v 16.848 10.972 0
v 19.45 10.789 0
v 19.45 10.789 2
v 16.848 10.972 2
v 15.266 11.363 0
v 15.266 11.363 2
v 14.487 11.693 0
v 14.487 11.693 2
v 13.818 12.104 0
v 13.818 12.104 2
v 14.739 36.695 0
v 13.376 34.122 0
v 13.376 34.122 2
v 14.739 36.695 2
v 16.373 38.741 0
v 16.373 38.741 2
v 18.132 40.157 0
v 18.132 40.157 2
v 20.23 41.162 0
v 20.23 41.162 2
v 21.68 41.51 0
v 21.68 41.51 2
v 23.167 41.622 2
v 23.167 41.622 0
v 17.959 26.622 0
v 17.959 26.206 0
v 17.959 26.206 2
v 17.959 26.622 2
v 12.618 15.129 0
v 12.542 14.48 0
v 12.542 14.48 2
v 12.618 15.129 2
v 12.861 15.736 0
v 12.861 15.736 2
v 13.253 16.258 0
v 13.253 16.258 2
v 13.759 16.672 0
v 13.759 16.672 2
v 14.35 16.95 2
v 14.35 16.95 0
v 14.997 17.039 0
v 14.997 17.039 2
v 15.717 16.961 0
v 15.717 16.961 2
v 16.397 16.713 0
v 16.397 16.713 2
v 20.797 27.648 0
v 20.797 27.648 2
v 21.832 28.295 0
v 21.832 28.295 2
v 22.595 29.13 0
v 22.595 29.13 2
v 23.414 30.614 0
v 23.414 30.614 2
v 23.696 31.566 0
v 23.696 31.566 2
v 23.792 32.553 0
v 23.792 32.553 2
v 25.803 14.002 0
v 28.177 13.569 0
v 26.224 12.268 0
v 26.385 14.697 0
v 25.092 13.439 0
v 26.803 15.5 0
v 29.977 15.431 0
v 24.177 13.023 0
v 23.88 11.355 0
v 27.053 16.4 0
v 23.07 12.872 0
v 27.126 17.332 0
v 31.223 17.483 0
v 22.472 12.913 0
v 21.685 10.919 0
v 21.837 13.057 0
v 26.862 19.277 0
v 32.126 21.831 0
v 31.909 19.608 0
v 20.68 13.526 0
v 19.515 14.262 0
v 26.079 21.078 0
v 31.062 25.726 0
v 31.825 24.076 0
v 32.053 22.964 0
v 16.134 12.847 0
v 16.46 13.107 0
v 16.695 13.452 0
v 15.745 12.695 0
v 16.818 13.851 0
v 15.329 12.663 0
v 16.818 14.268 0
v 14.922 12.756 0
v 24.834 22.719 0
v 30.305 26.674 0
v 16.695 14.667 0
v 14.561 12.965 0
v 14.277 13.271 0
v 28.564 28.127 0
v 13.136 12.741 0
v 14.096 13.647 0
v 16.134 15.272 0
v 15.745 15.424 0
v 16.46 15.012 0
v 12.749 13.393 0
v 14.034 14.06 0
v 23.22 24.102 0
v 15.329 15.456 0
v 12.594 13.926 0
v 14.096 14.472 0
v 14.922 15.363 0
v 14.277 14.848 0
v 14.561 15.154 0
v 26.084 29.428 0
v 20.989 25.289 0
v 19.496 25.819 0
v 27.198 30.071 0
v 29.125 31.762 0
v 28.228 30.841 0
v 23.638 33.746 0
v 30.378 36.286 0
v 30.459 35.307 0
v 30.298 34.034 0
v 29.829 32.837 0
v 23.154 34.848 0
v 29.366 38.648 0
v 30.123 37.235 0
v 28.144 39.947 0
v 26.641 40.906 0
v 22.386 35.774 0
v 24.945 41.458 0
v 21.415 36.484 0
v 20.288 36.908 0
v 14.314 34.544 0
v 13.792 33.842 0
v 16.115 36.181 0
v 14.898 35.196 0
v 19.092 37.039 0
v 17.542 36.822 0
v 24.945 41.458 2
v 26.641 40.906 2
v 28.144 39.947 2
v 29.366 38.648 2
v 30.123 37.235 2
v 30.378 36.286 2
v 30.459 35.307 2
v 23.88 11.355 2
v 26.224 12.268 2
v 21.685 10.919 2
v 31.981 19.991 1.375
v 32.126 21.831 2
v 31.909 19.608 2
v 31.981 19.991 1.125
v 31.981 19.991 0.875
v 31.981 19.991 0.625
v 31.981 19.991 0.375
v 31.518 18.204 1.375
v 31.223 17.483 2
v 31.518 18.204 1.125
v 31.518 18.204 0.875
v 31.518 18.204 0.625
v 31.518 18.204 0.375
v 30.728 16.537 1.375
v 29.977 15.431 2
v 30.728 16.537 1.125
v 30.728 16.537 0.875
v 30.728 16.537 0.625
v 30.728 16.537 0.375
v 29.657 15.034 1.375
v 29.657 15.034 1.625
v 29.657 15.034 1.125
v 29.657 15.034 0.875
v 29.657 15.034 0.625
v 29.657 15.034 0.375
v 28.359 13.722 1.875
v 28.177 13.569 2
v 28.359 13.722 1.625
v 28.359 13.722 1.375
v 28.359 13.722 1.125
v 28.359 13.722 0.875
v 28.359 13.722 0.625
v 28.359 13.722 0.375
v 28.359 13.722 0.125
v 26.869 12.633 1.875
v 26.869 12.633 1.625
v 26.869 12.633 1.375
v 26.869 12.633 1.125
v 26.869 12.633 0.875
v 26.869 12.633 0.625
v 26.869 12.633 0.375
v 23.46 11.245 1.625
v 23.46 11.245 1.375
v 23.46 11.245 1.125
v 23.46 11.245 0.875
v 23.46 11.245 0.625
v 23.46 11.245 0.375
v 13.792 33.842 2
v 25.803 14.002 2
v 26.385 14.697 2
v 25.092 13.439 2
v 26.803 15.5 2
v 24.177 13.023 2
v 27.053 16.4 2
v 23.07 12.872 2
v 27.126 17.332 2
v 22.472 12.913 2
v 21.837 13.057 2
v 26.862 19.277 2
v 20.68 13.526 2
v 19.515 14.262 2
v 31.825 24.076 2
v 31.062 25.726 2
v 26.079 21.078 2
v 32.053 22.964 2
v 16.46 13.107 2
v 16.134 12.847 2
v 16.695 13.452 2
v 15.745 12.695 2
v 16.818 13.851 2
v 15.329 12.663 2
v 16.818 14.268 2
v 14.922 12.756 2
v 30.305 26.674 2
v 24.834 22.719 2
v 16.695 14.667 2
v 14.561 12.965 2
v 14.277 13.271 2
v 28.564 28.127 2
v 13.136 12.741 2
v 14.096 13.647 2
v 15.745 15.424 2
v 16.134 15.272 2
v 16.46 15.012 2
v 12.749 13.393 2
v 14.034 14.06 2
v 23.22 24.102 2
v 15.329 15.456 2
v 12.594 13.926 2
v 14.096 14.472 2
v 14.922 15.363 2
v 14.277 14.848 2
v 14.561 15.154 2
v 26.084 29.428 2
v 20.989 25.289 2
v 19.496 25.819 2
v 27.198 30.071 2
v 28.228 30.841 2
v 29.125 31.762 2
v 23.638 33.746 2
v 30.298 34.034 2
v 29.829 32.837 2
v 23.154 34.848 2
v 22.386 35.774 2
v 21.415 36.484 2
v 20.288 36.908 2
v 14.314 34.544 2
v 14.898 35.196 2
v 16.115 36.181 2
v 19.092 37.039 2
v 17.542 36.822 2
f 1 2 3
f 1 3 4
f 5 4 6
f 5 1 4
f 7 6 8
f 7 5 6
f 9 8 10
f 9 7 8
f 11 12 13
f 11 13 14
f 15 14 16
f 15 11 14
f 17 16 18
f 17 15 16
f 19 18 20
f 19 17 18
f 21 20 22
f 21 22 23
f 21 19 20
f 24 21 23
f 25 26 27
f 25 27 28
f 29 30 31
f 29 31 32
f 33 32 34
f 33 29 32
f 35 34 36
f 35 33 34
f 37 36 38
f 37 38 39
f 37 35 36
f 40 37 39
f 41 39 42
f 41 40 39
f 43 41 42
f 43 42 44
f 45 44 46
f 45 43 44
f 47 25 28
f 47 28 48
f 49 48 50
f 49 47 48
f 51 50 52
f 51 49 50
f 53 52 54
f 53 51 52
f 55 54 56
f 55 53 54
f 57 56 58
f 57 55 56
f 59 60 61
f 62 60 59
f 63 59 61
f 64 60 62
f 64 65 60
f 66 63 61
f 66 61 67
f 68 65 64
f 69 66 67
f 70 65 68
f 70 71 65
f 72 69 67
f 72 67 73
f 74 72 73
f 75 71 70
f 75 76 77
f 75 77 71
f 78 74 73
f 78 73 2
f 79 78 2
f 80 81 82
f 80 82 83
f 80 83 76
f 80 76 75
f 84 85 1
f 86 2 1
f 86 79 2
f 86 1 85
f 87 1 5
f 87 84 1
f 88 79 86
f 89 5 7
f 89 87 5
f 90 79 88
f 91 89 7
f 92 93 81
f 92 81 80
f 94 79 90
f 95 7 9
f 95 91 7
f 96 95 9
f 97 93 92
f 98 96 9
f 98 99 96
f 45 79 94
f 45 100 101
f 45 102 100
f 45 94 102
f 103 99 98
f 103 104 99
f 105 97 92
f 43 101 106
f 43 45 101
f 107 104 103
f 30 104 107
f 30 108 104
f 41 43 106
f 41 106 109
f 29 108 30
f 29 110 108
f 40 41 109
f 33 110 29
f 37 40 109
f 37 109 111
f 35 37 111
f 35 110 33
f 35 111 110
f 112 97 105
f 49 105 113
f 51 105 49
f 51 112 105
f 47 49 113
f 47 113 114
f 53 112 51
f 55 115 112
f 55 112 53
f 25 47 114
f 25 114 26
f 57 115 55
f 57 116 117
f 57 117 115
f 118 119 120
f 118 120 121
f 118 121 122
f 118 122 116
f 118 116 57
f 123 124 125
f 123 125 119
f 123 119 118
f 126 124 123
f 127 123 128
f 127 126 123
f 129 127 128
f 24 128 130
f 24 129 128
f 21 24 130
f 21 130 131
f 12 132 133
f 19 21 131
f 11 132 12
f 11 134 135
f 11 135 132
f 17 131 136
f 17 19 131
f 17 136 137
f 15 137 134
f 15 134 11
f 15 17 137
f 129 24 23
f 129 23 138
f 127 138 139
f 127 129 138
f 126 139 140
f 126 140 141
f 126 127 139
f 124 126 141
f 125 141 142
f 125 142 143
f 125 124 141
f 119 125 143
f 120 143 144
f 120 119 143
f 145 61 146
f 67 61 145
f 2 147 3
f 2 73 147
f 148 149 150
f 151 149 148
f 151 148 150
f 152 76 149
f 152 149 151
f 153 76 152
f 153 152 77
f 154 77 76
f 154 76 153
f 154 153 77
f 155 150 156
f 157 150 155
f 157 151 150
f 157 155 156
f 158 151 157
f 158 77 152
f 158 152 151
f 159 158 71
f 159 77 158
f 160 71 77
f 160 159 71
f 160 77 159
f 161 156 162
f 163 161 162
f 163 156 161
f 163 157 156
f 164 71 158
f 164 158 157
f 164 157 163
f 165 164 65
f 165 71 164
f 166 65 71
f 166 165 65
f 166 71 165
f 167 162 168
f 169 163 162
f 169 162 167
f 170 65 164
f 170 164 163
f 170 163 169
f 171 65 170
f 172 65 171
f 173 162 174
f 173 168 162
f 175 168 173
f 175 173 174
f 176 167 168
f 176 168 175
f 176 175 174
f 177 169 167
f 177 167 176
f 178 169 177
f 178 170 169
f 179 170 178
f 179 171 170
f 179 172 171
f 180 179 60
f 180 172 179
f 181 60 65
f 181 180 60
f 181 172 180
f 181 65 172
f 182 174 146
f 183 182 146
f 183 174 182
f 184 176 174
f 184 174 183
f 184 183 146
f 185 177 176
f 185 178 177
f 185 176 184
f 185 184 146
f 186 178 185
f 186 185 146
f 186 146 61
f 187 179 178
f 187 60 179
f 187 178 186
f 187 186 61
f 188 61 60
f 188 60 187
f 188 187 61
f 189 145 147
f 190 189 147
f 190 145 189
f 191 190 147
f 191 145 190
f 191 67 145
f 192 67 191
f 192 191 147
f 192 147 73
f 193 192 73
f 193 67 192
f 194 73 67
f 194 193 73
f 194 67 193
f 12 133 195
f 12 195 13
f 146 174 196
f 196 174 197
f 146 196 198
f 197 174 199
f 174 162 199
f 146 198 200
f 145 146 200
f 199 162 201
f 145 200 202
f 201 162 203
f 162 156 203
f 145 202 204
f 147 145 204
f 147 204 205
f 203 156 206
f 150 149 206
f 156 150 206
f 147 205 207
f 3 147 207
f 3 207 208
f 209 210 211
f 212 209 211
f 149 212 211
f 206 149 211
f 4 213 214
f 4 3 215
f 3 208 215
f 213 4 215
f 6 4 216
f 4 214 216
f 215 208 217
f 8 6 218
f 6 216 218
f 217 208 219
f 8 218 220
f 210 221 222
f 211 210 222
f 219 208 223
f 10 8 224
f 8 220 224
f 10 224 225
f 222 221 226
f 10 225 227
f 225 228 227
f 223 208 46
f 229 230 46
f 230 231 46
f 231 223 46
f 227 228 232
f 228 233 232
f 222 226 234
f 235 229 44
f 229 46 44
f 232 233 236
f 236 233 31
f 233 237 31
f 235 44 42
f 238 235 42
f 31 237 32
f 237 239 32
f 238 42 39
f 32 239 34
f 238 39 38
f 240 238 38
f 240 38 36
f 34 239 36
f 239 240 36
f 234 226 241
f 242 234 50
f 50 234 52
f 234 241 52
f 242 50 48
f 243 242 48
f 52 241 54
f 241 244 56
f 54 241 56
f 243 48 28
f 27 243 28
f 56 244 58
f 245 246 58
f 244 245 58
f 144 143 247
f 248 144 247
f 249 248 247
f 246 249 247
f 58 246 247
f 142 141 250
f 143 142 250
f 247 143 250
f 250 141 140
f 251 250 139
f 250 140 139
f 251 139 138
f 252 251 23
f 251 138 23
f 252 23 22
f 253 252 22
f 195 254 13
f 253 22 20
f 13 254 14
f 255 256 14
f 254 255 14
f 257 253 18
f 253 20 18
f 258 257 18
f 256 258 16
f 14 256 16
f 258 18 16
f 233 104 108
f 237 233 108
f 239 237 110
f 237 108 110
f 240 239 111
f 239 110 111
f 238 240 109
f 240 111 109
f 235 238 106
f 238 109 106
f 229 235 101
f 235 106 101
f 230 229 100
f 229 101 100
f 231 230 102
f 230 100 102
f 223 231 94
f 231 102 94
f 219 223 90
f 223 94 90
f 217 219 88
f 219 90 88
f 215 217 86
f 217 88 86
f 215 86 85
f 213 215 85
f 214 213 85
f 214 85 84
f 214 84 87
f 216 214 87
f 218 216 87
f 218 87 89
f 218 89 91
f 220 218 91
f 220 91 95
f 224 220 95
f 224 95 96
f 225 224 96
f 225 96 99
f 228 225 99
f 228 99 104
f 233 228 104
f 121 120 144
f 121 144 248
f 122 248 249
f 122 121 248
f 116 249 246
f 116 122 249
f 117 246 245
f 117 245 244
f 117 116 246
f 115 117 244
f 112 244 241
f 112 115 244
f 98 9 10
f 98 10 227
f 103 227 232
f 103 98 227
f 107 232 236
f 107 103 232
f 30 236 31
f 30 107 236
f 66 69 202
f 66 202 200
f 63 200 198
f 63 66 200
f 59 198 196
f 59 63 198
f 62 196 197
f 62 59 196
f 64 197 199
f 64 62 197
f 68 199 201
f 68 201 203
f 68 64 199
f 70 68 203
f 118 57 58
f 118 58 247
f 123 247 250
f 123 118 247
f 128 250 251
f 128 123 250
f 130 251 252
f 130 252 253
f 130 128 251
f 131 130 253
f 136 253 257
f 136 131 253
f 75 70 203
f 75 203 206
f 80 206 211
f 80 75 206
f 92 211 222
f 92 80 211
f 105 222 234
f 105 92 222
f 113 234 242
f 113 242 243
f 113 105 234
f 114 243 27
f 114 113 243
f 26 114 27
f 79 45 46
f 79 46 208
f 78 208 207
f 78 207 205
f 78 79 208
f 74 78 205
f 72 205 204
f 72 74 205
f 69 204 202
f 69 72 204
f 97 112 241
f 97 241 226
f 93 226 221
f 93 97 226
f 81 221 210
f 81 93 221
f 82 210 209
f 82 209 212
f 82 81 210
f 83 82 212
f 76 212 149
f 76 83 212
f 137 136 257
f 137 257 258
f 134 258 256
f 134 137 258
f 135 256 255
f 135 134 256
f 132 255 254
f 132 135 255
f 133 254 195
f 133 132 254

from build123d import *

# Parameters (mm, degrees)
BOSS_EXTRU_1_DEPTH     = 2
D_GAGEMENT_M1_61_D     = 2.8
D_GAGEMENT_M1_61_DEPTH = 50


with BuildPart() as part:
    # Esquisse1 → Boss.-Extru.1 (new body)
    with BuildSketch(Plane.XY):
        with BuildLine():
            Line((17.959030639, 26.205600965), (17.959030639, 26.622267631))
            add(Edge.make_bspline(
                [(17.959030639, 26.622267631), (18.343864616, 26.741397646), (19.054570562, 26.961405273), (20.022450596, 27.297920725), (20.793226188, 27.636579921), (21.41178798, 27.961488766), (21.908982881, 28.341815064), (22.337860827, 28.794274398), (22.745767228, 29.315922342), (23.100821165, 29.915217516), (23.404700203, 30.554453208), (23.629309446, 31.215567304), (23.763709267, 31.883766695), (23.782865125, 32.331325489), (23.792363972, 32.553257215)],
                knots=[0, 0, 0, 0, 0.001208643, 0.002232104, 0.00307162, 0.00373306, 0.004322927, 0.004939873, 0.005598809, 0.006305572, 0.007024936, 0.007718746, 0.008395454, 0.009061078, 0.009061078, 0.009061078, 0.009061078], degree=3))
            add(Edge.make_bspline(
                [(23.792363972, 32.553257215), (23.777386918, 32.852688112), (23.748055085, 33.439108991), (23.476567737, 34.279205766), (23.05714352, 35.057842573), (22.458742382, 35.737618504), (21.754419772, 36.319188825), (20.93943387, 36.736582451), (20.042557045, 36.993204136), (19.414778602, 37.023400823), (19.091843139, 37.038934298)],
                knots=[0, 0, 0, 0, 0.000895934, 0.001754643, 0.002622874, 0.003532401, 0.004453596, 0.005347517, 0.006260578, 0.00722783, 0.00722783, 0.00722783, 0.00722783], degree=3))
            add(Edge.make_bspline(
                [(19.091843139, 37.038934298), (18.837161984, 37.028730471), (18.332048004, 37.008493028), (17.589929818, 36.851833428), (16.873770404, 36.606012306), (16.192473244, 36.248273134), (15.543091586, 35.792770869), (14.921293512, 35.239939745), (14.326825129, 34.587834171), (13.974057459, 34.09576212), (13.792363972, 33.842319715)],
                knots=[0, 0, 0, 0, 0.000763497, 0.001514259, 0.002265782, 0.003028696, 0.003814328, 0.00463992, 0.005520176, 0.006455072, 0.006455072, 0.006455072, 0.006455072], degree=3))
            Line((13.792363972, 33.842319715), (13.375697305, 34.122267631))
            add(Edge.make_bspline(
                [(13.375697305, 34.122267631), (13.510916636, 34.425682129), (13.776186581, 35.020913198), (14.228639052, 35.866364802), (14.704321949, 36.658922192), (15.208701066, 37.393656614), (15.747914733, 38.066450786), (16.30334539, 38.689832329), (16.901929928, 39.242421404), (17.518942178, 39.746587607), (18.161562629, 40.188329144), (18.825333438, 40.56768276), (19.502786648, 40.895073714), (20.200594753, 41.165416985), (20.919701634, 41.362325279), (21.651327947, 41.517971289), (22.403776863, 41.600218242), (22.911118447, 41.614868269), (23.167363972, 41.622267631)],
                knots=[0, 0, 0, 0, 0.000996264, 0.001954446, 0.002874467, 0.003768388, 0.004625516, 0.00545979, 0.006270487, 0.007066623, 0.007848551, 0.008606812, 0.009358081, 0.010104085, 0.010848127, 0.01159251, 0.012345976, 0.013114895, 0.013114895, 0.013114895, 0.013114895], degree=3))
            add(Edge.make_bspline(
                [(23.167363972, 41.622267631), (23.425791745, 41.614983016), (23.933173823, 41.600680825), (24.677057927, 41.518913442), (25.384705116, 41.366868736), (26.058351561, 41.158541993), (26.698214256, 40.8923311), (27.301514696, 40.563537155), (27.870481667, 40.17749841), (28.399513113, 39.738387953), (28.879361945, 39.257419617), (29.303120014, 38.753903461), (29.656569633, 38.225779159), (29.957219958, 37.685185331), (30.173389647, 37.115034391), (30.341250724, 36.530244936), (30.440141633, 35.924669619), (30.452713728, 35.51367148), (30.459030639, 35.307163465)],
                knots=[0, 0, 0, 0, 0.000775423, 0.001522421, 0.002241313, 0.002943503, 0.003635111, 0.004316811, 0.005001179, 0.005694714, 0.006376041, 0.007037065, 0.007665447, 0.008280121, 0.008888244, 0.009490097, 0.01010339, 0.010722736, 0.010722736, 0.010722736, 0.010722736], degree=3))
            add(Edge.make_bspline(
                [(30.459030639, 35.307163465), (30.447158807, 35.032431887), (30.423372861, 34.481990271), (30.207499814, 33.669804093), (29.870845724, 32.875447195), (29.406441017, 32.094801504), (28.793891015, 31.349972333), (28.033907379, 30.648154276), (27.122314827, 29.995513978), (26.440011523, 29.62274401), (26.084030639, 29.428257215)],
                knots=[0, 0, 0, 0, 0.000822892, 0.001648715, 0.00250359, 0.003405746, 0.004363574, 0.005386228, 0.006501031, 0.007717155, 0.007717155, 0.007717155, 0.007717155], degree=3))
            add(Edge.make_bspline(
                [(26.084030639, 29.428257215), (26.323914541, 29.324444629), (26.793646108, 29.121162758), (27.463071461, 28.780326156), (28.091811141, 28.428074399), (28.677960237, 28.061453436), (29.21434292, 27.663484448), (29.717044592, 27.260629192), (30.165030422, 26.824993358), (30.581071213, 26.383454807), (30.947389596, 25.914206817), (31.260635471, 25.415469605), (31.530028979, 24.891065411), (31.752787412, 24.33608079), (31.921404001, 23.749058536), (32.036253088, 23.134083858), (32.110353733, 22.492118171), (32.120507898, 22.054335181), (32.125697305, 21.830600965)],
                knots=[0, 0, 0, 0, 0.000783985, 0.00153517, 0.002252262, 0.002945828, 0.003607332, 0.004255045, 0.004876679, 0.005480184, 0.006074026, 0.006659239, 0.007244489, 0.007840504, 0.008450401, 0.0090735, 0.009715527, 0.010386605, 0.010386605, 0.010386605, 0.010386605], degree=3))
            add(Edge.make_bspline(
                [(32.125697305, 21.830600965), (32.116585867, 21.454528433), (32.09859048, 20.711772938), (31.928747652, 19.621430171), (31.664992357, 18.572417194), (31.282766685, 17.568576979), (30.792488355, 16.608949336), (30.193933235, 15.692700581), (29.494790214, 14.815856568), (28.689901662, 13.993854034), (27.796047655, 13.240547726), (26.82196978, 12.579418652), (25.772537841, 12.021668432), (24.646553648, 11.574509682), (23.449854527, 11.222835447), (22.182246271, 10.969420114), (20.840283071, 10.818660473), (19.92122973, 10.799011028), (19.449916055, 10.788934298)],
                knots=[0, 0, 0, 0, 0.001127506, 0.00222686, 0.003302183, 0.004367448, 0.005441844, 0.006528927, 0.007645326, 0.008800902, 0.009974584, 0.011146496, 0.012326031, 0.013532568, 0.014774762, 0.016063051, 0.017406061, 0.018819781, 0.018819781, 0.018819781, 0.018819781], degree=3))
            add(Edge.make_bspline(
                [(19.449916055, 10.788934298), (19.1394039, 10.791459247), (18.539342266, 10.796338687), (17.673235137, 10.868073843), (16.86860967, 10.955320781), (16.133415709, 11.111218727), (15.455910697, 11.288135838), (14.845916443, 11.515680504), (14.297126694, 11.779418084), (13.974531131, 11.998169888), (13.818405639, 12.104038465)],
                knots=[0, 0, 0, 0, 0.000931194, 0.001799524, 0.002606238, 0.003356999, 0.004051908, 0.004704932, 0.00530763, 0.005872875, 0.005872875, 0.005872875, 0.005872875], degree=3))
            add(Edge.make_bspline(
                [(13.818405639, 12.104038465), (13.622943123, 12.260262087), (13.247911582, 12.560006441), (12.839574491, 13.142561528), (12.583214643, 13.789372904), (12.556103646, 14.24794118), (12.542363972, 14.480340548)],
                knots=[0, 0, 0, 0, 0.000747196, 0.001433636, 0.002109529, 0.002804041, 0.002804041, 0.002804041, 0.002804041], degree=3))
            add(Edge.make_bspline(
                [(12.542363972, 14.480340548), (12.549583483, 14.653080665), (12.563656256, 14.989797732), (12.719906346, 15.469105965), (12.94522911, 15.915073284), (13.274781311, 16.300621428), (13.657259063, 16.62029218), (14.076113089, 16.863324884), (14.526506031, 17.014904891), (14.839398992, 17.030892286), (14.996791055, 17.038934298)],
                knots=[0, 0, 0, 0, 0.000516338, 0.001006482, 0.001498611, 0.002007091, 0.002515571, 0.002987968, 0.00345327, 0.00392423, 0.00392423, 0.00392423, 0.00392423], degree=3))
            add(Edge.make_bspline(
                [(14.996791055, 17.038934298), (15.241018236, 17.027229373), (15.727455987, 17.003916171), (16.174123, 16.809979701), (16.396530639, 16.713413465)],
                knots=[0, 0, 0, 0, 0.000726867, 0.001447732, 0.001447732, 0.001447732, 0.001447732], degree=3))
            add(Edge.make_bspline(
                [(16.396530639, 16.713413465), (16.435892602, 16.690004381), (16.536858718, 16.629958487), (16.710965114, 16.503256943), (16.943128645, 16.326829434), (17.239857644, 16.108629339), (17.580157452, 15.821522929), (17.995048658, 15.502924159), (18.452261546, 15.11427143), (18.959242705, 14.696096576), (19.485532123, 14.275369842), (20.021026068, 13.90069265), (20.551288651, 13.588104953), (21.068195453, 13.323940502), (21.582360269, 13.12767496), (22.085332973, 12.98439783), (22.579693672, 12.884937338), (22.908666405, 12.876431484), (23.069707722, 12.872267631)],
                knots=[0, 0, 0, 0, 0.000137337, 0.00035228, 0.000645249, 0.001012438, 0.001456771, 0.001980405, 0.002581412, 0.003256614, 0.003952102, 0.004602265, 0.005215247, 0.005797557, 0.006341634, 0.006862996, 0.007366113, 0.007848587, 0.007848587, 0.007848587, 0.007848587], degree=3))
            add(Edge.make_bspline(
                [(23.069707722, 12.872267631), (23.338306519, 12.886947683), (23.868808121, 12.915941824), (24.633937345, 13.158470559), (25.328570089, 13.56932886), (25.952733661, 14.117449245), (26.478377861, 14.784984831), (26.85464363, 15.562484997), (27.091396847, 16.419598566), (27.114051321, 17.022149636), (27.125697305, 17.331903048)],
                knots=[0, 0, 0, 0, 0.000804583, 0.001589109, 0.002379689, 0.003210169, 0.004068384, 0.004909841, 0.005786333, 0.006713582, 0.006713582, 0.006713582, 0.006713582], degree=3))
            add(Edge.make_bspline(
                [(27.125697305, 17.331903048), (27.117144204, 17.575296651), (27.100114493, 18.059907185), (26.99489612, 18.780602047), (26.813762292, 19.486642151), (26.544798244, 20.173310162), (26.223836644, 20.853807897), (25.815647288, 21.511948927), (25.333937106, 22.152472296), (24.792001689, 22.783011859), (24.175761846, 23.381013515), (23.486608569, 23.928826911), (22.733652267, 24.432466304), (21.911470291, 24.889571318), (21.017813721, 25.288512907), (20.061694455, 25.64840206), (19.038481137, 25.963905147), (18.324865466, 26.123688225), (17.959030639, 26.205600965)],
                knots=[0, 0, 0, 0, 0.000730212, 0.001453894, 0.002180265, 0.002911782, 0.003663052, 0.004434612, 0.005230189, 0.00606558, 0.006926556, 0.007801983, 0.008703012, 0.009641415, 0.010620427, 0.011636156, 0.012704996, 0.01382932, 0.01382932, 0.01382932, 0.01382932], degree=3))
        make_face()
    extrude(amount=BOSS_EXTRU_1_DEPTH)

    # Dégagement M1.61
    with Locations(Plane.XY.offset(2)):
        with Locations((15.433784775, 14.059510845)):
            Hole(D_GAGEMENT_M1_61_D / 2, depth=D_GAGEMENT_M1_61_DEPTH)


solid = part.part
